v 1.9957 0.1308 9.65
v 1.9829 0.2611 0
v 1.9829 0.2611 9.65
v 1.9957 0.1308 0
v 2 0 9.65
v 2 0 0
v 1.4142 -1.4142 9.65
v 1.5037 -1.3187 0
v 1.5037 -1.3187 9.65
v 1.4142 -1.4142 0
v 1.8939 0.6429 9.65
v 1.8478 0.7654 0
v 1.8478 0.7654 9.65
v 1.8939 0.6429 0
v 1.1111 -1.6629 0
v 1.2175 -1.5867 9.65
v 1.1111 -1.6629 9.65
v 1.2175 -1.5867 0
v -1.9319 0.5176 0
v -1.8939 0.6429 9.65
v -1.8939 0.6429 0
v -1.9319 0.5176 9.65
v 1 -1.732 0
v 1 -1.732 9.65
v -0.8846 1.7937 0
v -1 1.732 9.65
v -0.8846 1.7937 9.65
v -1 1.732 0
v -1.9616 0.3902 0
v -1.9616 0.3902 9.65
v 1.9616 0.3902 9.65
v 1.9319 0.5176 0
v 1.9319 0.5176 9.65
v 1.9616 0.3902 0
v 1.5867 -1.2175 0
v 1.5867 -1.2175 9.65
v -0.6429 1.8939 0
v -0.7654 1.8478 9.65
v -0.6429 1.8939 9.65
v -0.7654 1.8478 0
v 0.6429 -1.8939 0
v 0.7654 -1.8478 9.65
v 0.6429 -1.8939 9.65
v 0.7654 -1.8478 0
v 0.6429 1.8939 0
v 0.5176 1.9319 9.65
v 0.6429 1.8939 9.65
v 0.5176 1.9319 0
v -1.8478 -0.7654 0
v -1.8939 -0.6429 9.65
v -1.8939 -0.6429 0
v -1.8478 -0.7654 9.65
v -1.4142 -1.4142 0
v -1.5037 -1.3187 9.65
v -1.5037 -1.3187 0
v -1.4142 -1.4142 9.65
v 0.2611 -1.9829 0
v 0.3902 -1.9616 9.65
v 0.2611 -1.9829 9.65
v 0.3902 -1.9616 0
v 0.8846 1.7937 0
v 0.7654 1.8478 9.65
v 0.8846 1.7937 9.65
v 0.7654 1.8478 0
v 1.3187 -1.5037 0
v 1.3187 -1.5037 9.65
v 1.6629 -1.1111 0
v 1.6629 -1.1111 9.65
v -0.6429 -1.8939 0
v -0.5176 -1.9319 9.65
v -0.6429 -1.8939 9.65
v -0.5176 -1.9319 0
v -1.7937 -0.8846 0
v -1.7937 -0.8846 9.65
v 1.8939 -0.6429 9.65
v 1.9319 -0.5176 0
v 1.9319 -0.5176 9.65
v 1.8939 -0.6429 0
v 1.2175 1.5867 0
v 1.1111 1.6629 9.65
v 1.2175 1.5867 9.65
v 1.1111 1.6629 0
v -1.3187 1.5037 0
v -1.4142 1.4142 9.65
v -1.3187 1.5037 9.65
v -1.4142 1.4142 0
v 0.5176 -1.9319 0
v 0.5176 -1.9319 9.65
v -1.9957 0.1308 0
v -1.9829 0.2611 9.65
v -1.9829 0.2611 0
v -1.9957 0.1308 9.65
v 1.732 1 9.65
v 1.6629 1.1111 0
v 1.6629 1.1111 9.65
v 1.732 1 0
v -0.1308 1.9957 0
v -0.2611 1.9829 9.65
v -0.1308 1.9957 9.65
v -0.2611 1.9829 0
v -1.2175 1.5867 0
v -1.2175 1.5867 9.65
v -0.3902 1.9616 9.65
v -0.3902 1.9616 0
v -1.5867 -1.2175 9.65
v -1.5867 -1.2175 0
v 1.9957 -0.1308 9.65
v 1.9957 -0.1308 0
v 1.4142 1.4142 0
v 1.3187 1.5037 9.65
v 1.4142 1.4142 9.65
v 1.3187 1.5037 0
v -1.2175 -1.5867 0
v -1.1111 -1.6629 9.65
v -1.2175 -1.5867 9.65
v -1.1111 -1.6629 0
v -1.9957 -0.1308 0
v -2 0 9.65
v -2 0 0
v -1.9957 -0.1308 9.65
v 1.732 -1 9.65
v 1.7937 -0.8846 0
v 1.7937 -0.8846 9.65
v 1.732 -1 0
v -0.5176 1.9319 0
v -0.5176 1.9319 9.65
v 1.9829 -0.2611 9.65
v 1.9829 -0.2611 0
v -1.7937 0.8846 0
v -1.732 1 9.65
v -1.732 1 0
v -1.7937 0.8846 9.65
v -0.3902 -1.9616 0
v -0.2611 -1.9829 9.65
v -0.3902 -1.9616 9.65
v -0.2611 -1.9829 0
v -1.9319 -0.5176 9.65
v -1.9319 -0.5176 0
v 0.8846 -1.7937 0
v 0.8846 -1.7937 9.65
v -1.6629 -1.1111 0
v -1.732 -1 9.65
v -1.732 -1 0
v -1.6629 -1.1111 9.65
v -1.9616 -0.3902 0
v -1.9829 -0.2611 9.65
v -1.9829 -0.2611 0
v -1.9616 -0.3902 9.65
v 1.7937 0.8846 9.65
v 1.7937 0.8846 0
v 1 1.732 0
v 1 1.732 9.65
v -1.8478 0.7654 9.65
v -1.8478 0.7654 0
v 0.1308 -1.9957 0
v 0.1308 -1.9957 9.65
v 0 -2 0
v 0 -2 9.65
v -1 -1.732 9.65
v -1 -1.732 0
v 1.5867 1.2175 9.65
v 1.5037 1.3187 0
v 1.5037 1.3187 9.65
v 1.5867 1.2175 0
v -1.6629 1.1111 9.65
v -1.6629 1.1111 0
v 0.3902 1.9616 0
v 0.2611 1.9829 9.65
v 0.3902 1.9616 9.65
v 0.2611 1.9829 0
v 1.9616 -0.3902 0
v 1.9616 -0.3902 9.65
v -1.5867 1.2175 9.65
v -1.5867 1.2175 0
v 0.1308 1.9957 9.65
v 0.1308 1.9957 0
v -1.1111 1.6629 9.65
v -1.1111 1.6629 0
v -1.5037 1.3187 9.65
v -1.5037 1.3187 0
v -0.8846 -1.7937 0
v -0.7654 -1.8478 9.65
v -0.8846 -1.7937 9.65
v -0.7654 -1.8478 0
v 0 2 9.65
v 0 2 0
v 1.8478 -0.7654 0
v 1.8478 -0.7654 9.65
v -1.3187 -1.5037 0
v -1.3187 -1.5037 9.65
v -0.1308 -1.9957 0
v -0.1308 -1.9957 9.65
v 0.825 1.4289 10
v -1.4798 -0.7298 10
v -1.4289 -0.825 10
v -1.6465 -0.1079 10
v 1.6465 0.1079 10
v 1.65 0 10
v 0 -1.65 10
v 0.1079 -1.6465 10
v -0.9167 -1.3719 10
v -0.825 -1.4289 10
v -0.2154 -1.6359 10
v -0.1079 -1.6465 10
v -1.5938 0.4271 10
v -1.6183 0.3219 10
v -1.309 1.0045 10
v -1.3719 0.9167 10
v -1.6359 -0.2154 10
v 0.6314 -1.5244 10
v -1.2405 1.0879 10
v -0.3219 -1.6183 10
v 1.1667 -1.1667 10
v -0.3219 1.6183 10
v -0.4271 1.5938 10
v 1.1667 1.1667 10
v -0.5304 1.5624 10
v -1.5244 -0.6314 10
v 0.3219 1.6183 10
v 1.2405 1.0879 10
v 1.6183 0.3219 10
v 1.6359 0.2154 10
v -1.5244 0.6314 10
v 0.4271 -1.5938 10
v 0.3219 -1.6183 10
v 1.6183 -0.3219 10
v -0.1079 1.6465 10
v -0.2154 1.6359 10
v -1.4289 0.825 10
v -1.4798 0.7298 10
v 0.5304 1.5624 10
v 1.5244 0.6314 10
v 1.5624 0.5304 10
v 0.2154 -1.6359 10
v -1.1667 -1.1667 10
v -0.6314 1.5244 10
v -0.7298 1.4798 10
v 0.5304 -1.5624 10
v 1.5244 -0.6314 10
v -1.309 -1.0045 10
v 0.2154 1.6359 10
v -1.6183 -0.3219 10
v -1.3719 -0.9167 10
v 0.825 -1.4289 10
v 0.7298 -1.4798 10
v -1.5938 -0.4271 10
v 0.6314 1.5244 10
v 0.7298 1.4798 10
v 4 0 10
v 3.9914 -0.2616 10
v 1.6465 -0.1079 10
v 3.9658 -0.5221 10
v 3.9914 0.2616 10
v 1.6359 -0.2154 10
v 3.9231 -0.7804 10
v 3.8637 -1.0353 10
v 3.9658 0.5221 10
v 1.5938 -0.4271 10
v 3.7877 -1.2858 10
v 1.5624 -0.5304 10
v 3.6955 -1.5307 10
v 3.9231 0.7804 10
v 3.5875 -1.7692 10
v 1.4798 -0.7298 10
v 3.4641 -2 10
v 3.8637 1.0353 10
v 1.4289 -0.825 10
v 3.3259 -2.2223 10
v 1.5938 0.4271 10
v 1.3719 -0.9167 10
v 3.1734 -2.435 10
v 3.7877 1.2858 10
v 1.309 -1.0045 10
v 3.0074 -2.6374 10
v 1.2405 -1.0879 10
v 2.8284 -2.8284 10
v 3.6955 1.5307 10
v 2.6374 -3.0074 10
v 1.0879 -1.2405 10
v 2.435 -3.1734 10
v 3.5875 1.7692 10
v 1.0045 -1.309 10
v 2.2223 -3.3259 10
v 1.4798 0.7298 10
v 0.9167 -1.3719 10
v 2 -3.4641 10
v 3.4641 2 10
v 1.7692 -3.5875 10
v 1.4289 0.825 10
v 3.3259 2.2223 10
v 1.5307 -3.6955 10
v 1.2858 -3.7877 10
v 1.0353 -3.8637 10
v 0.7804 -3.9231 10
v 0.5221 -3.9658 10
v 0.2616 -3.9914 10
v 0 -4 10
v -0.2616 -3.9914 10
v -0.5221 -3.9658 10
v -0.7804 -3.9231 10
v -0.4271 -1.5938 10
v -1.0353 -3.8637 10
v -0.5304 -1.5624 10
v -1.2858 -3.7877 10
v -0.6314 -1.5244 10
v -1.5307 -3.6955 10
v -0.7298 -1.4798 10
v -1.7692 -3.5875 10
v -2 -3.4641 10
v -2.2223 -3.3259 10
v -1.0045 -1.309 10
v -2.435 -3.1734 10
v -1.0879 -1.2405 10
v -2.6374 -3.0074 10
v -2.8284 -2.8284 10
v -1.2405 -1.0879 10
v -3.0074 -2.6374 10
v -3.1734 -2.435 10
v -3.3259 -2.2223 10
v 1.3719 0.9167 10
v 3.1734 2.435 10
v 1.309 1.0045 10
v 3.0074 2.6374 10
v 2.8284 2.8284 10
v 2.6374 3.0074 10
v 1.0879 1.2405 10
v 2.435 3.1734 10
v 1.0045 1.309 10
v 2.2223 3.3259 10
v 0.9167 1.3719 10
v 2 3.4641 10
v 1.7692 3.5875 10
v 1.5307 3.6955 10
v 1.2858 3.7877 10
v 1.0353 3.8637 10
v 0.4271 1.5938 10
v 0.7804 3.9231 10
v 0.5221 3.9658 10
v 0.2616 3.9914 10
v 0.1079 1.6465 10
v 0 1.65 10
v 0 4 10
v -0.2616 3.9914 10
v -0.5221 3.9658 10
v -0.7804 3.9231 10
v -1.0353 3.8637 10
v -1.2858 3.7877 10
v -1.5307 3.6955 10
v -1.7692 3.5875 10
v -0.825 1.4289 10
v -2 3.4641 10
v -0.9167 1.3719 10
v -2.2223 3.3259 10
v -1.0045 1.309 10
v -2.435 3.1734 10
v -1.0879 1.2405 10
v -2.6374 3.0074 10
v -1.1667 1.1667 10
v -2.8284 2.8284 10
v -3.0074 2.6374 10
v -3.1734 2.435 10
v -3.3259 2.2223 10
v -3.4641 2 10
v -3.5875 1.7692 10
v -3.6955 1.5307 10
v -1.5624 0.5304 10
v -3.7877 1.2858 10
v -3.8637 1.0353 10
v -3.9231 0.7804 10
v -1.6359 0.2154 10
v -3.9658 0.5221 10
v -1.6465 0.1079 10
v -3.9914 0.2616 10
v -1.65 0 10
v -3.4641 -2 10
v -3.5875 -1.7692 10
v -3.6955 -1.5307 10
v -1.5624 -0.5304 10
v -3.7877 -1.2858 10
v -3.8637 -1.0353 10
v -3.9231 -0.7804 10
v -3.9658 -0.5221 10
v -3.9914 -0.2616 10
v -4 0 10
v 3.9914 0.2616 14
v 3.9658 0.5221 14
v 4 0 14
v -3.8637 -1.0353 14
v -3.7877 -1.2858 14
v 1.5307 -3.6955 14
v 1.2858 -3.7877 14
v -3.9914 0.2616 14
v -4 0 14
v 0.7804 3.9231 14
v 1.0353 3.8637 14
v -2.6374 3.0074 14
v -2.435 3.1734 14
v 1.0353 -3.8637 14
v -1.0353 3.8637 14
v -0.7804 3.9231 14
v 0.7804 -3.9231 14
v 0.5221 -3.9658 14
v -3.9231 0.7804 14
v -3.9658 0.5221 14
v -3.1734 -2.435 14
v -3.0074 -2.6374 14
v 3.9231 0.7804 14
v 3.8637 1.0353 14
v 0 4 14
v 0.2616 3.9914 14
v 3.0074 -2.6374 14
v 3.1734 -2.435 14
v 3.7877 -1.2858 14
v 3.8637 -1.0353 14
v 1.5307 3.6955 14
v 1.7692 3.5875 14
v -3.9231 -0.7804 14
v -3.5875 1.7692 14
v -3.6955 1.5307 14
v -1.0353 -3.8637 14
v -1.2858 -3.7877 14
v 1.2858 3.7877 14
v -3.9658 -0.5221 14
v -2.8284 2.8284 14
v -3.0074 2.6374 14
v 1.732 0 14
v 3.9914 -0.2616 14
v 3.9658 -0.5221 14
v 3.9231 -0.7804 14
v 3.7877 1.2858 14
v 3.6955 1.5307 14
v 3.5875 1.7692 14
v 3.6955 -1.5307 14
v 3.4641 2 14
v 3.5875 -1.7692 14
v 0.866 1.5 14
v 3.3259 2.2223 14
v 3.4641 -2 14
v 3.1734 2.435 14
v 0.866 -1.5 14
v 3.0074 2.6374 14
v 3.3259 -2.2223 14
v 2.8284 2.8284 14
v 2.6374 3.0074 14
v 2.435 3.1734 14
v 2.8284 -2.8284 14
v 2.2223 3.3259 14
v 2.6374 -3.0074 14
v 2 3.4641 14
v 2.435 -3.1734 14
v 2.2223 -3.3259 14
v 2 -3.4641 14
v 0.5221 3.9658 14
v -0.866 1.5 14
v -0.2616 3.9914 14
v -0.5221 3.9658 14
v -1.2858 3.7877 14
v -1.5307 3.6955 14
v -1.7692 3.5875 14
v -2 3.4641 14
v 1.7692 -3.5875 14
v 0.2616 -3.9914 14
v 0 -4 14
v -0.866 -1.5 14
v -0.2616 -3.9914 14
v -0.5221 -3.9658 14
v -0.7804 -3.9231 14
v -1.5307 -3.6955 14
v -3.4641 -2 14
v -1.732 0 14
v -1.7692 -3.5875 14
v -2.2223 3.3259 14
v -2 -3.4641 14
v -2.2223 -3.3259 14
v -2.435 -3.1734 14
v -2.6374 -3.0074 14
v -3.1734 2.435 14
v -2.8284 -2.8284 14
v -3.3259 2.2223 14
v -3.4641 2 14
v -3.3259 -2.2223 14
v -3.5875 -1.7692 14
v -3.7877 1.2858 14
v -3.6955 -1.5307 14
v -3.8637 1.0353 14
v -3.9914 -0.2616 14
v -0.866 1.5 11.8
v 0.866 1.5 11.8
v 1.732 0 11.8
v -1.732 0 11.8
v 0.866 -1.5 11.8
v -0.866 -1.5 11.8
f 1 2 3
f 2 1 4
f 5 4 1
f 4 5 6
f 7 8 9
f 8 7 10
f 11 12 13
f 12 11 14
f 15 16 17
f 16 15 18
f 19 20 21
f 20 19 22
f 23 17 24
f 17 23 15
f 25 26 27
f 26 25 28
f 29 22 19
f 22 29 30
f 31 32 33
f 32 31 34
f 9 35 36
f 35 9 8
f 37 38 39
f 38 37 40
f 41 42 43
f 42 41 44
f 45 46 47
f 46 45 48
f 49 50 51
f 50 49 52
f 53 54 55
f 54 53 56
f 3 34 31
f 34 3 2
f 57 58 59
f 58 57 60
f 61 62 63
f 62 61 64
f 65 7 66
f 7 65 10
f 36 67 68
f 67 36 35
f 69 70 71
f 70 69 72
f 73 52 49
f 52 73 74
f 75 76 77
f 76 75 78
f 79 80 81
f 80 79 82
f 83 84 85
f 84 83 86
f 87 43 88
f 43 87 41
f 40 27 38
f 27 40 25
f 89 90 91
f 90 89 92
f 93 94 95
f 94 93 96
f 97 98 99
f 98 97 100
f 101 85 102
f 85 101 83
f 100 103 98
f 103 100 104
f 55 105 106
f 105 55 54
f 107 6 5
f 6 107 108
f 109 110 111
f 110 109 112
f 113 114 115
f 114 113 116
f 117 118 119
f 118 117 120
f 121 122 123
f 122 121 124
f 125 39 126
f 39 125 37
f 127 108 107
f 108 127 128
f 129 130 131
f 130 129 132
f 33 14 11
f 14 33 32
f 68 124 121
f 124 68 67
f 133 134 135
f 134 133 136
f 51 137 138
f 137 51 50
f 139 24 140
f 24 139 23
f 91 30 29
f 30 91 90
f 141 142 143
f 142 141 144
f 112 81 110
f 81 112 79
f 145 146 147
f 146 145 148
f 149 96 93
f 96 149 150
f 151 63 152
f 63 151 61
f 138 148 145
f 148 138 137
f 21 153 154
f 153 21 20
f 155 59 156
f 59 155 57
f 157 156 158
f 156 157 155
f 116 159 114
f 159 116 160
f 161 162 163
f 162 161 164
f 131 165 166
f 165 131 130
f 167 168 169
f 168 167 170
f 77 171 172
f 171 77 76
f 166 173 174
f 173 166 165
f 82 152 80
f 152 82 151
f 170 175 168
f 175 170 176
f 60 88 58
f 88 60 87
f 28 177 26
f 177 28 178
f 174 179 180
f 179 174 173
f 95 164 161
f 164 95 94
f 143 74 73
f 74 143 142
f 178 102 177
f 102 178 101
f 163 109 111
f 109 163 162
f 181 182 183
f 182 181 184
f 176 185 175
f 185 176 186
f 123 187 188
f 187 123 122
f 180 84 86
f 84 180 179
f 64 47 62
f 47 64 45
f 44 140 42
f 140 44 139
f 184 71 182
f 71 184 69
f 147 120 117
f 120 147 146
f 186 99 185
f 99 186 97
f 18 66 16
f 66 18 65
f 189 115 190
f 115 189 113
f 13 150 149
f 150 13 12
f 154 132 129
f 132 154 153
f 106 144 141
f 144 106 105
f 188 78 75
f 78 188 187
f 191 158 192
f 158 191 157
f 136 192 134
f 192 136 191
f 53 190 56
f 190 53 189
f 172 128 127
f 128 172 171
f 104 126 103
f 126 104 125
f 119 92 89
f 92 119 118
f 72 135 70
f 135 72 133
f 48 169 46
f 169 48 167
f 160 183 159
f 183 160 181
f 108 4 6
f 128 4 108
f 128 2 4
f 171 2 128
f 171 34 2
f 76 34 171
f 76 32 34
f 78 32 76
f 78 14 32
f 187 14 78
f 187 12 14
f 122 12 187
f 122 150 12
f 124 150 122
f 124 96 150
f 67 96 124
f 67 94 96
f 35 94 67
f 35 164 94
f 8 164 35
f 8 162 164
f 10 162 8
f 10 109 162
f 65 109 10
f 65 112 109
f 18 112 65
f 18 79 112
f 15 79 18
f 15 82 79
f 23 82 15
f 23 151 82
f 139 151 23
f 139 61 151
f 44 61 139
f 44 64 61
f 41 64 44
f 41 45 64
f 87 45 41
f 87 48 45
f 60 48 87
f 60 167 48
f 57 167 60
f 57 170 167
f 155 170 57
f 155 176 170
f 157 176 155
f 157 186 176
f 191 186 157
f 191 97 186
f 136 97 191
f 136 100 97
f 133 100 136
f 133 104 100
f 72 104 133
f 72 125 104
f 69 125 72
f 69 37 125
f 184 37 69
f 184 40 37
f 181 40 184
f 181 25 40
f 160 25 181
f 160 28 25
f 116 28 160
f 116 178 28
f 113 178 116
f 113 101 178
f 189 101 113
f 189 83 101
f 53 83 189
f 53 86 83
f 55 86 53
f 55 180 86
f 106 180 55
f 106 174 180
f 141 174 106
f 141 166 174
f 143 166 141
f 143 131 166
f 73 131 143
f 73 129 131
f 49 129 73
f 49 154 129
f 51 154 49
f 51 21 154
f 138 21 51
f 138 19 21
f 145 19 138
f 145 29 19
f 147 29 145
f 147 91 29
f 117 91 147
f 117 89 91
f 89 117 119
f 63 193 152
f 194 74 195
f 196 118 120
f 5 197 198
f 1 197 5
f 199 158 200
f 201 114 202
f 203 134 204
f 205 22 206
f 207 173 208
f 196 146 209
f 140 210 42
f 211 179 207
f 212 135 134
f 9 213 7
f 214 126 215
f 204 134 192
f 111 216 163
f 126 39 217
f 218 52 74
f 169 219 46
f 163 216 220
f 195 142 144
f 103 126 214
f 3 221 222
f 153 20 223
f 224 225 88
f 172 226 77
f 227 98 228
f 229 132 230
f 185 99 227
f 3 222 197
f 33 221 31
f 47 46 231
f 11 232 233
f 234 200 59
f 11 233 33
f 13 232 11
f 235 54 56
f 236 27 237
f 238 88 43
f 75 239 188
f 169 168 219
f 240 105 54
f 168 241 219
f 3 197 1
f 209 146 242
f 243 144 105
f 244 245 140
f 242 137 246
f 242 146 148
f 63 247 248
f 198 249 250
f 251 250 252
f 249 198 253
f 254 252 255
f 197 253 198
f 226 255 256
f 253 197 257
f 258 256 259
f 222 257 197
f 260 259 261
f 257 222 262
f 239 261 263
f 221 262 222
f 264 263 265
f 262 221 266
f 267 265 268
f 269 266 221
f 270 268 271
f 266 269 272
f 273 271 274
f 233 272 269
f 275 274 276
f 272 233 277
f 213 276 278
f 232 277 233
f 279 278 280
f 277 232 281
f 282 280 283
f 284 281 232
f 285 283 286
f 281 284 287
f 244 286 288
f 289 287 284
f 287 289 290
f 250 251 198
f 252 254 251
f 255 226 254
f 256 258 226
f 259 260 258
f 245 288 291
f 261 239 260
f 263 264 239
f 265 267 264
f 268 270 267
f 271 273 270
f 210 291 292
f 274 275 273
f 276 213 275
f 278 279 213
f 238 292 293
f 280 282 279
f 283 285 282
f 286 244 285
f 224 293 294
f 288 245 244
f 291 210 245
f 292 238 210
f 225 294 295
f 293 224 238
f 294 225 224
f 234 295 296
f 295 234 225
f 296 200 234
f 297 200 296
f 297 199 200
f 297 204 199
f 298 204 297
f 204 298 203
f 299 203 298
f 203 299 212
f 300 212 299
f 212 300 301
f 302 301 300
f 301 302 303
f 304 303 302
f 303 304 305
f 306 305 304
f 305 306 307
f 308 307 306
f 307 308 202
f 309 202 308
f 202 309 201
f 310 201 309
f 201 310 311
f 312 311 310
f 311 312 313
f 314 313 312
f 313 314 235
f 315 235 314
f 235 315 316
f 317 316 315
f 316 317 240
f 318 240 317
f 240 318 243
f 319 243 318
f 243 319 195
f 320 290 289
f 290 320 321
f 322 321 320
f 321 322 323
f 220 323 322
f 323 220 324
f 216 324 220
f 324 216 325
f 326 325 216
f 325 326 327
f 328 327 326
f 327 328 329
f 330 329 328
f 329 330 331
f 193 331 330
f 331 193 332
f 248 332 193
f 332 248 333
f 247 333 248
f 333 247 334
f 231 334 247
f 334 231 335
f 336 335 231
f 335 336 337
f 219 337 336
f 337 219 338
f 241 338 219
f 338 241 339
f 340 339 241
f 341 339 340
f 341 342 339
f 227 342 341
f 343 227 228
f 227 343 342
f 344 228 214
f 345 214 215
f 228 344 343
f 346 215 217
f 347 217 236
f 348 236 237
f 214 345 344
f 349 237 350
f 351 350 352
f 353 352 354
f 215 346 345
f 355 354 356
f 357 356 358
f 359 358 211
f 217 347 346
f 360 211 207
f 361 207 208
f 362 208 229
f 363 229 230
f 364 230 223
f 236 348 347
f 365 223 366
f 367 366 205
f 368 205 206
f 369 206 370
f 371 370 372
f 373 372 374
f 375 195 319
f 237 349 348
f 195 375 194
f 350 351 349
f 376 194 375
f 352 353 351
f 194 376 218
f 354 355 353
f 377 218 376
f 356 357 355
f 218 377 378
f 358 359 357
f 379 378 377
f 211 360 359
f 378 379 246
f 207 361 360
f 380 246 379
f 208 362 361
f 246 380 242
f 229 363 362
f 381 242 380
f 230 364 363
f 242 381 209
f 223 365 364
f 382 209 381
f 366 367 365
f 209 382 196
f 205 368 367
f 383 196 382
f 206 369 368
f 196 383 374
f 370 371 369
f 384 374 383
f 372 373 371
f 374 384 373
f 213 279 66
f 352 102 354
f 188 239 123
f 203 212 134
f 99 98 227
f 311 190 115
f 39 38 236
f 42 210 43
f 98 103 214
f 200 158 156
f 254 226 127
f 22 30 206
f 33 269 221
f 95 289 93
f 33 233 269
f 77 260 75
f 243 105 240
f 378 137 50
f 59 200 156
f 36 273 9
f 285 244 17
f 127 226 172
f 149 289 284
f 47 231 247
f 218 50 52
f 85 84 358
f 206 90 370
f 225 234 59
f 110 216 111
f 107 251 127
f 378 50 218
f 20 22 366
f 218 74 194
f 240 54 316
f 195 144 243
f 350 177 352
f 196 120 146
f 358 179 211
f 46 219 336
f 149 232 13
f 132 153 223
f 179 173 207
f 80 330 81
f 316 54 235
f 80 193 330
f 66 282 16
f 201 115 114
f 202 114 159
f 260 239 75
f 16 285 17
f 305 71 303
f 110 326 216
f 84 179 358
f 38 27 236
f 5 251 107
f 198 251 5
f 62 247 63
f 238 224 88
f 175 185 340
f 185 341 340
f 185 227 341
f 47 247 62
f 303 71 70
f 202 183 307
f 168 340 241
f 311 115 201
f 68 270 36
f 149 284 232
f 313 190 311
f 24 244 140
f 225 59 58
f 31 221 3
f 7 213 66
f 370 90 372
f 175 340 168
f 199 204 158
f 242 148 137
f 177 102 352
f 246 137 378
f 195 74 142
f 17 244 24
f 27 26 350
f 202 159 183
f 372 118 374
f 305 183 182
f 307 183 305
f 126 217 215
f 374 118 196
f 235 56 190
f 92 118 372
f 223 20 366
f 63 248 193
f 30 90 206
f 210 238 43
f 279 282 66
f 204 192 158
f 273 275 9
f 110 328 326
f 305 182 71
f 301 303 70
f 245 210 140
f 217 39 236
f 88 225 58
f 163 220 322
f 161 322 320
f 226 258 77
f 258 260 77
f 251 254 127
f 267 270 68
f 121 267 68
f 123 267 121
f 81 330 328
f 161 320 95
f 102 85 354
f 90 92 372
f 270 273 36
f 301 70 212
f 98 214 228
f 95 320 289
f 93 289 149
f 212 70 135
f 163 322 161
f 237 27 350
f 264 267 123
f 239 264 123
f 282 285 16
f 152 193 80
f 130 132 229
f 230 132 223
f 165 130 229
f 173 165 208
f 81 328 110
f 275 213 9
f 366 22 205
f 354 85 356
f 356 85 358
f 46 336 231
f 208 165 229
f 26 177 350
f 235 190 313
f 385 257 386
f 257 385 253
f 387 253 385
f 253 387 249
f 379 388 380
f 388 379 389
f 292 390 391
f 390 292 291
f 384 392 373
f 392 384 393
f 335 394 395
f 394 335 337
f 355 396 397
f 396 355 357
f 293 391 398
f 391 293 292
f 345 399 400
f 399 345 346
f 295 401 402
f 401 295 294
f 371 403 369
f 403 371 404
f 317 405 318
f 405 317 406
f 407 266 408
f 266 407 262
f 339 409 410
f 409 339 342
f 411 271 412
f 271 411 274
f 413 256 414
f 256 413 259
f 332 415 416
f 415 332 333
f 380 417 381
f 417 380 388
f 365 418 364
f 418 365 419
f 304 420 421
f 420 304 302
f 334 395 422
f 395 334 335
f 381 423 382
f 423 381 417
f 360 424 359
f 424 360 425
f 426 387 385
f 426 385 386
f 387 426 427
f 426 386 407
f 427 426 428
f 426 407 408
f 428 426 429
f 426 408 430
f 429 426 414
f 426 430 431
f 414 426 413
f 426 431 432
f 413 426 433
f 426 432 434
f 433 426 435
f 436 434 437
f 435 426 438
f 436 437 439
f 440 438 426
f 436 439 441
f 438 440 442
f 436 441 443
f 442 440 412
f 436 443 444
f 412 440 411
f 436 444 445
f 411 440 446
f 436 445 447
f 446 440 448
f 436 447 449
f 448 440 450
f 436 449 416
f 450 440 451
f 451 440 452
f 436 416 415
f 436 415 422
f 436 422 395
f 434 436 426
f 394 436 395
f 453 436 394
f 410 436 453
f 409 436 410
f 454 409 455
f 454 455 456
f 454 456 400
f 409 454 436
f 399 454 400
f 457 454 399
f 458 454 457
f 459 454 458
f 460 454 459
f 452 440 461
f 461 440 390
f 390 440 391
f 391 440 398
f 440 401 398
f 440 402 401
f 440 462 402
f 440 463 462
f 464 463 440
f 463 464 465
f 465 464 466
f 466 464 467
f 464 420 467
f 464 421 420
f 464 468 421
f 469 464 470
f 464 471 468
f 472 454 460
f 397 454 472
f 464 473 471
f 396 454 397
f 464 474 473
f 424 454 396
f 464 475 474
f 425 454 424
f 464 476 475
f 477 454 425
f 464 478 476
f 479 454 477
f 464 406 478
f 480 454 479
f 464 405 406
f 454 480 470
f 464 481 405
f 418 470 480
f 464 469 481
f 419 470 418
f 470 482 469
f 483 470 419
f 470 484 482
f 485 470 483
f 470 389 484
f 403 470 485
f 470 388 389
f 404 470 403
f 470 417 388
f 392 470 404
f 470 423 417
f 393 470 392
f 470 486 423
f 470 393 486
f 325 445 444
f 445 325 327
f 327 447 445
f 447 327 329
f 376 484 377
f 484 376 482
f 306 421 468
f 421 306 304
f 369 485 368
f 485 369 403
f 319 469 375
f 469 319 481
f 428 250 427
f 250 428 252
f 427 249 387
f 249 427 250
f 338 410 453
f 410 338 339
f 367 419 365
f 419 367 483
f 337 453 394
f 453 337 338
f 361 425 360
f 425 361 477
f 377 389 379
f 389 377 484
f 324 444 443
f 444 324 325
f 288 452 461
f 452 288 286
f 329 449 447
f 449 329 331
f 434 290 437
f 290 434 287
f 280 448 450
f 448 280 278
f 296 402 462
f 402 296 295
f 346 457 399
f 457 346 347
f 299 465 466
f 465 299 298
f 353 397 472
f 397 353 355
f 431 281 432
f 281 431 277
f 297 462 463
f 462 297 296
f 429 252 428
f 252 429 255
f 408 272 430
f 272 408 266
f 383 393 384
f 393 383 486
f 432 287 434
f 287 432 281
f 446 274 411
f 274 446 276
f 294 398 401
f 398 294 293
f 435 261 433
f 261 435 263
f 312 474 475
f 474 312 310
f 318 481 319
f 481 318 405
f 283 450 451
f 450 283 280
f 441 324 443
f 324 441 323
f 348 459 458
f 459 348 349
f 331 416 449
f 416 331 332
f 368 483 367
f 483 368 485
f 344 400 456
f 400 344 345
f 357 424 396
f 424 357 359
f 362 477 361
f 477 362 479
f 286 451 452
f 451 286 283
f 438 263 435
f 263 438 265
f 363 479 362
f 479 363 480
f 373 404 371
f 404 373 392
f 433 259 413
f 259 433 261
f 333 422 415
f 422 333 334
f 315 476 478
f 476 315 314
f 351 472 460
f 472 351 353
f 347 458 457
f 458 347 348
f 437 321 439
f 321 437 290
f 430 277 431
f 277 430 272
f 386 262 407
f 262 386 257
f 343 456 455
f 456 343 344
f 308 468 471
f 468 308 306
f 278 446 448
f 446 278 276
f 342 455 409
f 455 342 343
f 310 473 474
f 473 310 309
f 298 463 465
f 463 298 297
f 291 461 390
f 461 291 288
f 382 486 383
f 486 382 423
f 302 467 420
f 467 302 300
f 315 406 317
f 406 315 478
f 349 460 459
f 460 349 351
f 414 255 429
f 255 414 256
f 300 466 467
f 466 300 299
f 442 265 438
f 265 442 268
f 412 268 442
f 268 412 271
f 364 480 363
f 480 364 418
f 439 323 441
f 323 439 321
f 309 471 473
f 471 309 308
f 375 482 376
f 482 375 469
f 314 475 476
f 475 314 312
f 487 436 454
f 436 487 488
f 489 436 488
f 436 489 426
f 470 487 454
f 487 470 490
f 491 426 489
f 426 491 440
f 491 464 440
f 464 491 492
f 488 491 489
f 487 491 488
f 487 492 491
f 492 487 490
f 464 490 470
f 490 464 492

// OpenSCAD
$fn = 96;

// Socket Head Cap Screw (approx. ISO 4762)
// Parameters from prompt:
d_shank = 4.0;      // mm (nominal thread/shank diameter)
L = 10.0;           // mm (under-head length)
d_head = 8.0;       // mm (head diameter)

// Reasonable defaults for an M4-ish SHCS:
k_head = 4.0;       // mm (head height)
hex_af = 3.0;       // mm (hex key across flats, typical for M4)
hex_depth = 2.2;    // mm (socket depth)
tip_chamfer = 0.35; // mm (small chamfer on shank end)
underhead_chamfer = 0.25; // mm

module hex_socket(af, depth) {
    // Hex prism sized by across-flats (af)
    // For a regular hex, circumradius R = af / sqrt(3)
    R = af / sqrt(3);
    linear_extrude(height = depth)
        polygon([ for (i = [0:5]) [ R*cos(60*i), R*sin(60*i) ] ]);
}

module shank(d, len) {
    // Add a small chamfer at the tip
    union() {
        cylinder(d = d, h = len - tip_chamfer);
        translate([0,0,len - tip_chamfer])
            cylinder(d1 = d, d2 = max(d - 2*tip_chamfer, 0.01), h = tip_chamfer);
    }
}

module head(d, h) {
    // Slight underhead chamfer
    union() {
        cylinder(d = d, h = h);
        // underhead chamfer ring (subtract via hull-like frustum)
        // implemented as a small frustum at the bottom edge
        translate([0,0,0])
            cylinder(d1 = d - 2*underhead_chamfer, d2 = d, h = underhead_chamfer);
    }
}

difference() {
    union() {
        // Shank from z=0..L
        shank(d_shank, L);

        // Head on top from z=L..L+k_head
        translate([0,0,L])
            head(d_head, k_head);
    }

    // Hex socket cut into head from top
    translate([0,0,L + k_head - hex_depth])
        hex_socket(hex_af, hex_depth + 0.2);
}
